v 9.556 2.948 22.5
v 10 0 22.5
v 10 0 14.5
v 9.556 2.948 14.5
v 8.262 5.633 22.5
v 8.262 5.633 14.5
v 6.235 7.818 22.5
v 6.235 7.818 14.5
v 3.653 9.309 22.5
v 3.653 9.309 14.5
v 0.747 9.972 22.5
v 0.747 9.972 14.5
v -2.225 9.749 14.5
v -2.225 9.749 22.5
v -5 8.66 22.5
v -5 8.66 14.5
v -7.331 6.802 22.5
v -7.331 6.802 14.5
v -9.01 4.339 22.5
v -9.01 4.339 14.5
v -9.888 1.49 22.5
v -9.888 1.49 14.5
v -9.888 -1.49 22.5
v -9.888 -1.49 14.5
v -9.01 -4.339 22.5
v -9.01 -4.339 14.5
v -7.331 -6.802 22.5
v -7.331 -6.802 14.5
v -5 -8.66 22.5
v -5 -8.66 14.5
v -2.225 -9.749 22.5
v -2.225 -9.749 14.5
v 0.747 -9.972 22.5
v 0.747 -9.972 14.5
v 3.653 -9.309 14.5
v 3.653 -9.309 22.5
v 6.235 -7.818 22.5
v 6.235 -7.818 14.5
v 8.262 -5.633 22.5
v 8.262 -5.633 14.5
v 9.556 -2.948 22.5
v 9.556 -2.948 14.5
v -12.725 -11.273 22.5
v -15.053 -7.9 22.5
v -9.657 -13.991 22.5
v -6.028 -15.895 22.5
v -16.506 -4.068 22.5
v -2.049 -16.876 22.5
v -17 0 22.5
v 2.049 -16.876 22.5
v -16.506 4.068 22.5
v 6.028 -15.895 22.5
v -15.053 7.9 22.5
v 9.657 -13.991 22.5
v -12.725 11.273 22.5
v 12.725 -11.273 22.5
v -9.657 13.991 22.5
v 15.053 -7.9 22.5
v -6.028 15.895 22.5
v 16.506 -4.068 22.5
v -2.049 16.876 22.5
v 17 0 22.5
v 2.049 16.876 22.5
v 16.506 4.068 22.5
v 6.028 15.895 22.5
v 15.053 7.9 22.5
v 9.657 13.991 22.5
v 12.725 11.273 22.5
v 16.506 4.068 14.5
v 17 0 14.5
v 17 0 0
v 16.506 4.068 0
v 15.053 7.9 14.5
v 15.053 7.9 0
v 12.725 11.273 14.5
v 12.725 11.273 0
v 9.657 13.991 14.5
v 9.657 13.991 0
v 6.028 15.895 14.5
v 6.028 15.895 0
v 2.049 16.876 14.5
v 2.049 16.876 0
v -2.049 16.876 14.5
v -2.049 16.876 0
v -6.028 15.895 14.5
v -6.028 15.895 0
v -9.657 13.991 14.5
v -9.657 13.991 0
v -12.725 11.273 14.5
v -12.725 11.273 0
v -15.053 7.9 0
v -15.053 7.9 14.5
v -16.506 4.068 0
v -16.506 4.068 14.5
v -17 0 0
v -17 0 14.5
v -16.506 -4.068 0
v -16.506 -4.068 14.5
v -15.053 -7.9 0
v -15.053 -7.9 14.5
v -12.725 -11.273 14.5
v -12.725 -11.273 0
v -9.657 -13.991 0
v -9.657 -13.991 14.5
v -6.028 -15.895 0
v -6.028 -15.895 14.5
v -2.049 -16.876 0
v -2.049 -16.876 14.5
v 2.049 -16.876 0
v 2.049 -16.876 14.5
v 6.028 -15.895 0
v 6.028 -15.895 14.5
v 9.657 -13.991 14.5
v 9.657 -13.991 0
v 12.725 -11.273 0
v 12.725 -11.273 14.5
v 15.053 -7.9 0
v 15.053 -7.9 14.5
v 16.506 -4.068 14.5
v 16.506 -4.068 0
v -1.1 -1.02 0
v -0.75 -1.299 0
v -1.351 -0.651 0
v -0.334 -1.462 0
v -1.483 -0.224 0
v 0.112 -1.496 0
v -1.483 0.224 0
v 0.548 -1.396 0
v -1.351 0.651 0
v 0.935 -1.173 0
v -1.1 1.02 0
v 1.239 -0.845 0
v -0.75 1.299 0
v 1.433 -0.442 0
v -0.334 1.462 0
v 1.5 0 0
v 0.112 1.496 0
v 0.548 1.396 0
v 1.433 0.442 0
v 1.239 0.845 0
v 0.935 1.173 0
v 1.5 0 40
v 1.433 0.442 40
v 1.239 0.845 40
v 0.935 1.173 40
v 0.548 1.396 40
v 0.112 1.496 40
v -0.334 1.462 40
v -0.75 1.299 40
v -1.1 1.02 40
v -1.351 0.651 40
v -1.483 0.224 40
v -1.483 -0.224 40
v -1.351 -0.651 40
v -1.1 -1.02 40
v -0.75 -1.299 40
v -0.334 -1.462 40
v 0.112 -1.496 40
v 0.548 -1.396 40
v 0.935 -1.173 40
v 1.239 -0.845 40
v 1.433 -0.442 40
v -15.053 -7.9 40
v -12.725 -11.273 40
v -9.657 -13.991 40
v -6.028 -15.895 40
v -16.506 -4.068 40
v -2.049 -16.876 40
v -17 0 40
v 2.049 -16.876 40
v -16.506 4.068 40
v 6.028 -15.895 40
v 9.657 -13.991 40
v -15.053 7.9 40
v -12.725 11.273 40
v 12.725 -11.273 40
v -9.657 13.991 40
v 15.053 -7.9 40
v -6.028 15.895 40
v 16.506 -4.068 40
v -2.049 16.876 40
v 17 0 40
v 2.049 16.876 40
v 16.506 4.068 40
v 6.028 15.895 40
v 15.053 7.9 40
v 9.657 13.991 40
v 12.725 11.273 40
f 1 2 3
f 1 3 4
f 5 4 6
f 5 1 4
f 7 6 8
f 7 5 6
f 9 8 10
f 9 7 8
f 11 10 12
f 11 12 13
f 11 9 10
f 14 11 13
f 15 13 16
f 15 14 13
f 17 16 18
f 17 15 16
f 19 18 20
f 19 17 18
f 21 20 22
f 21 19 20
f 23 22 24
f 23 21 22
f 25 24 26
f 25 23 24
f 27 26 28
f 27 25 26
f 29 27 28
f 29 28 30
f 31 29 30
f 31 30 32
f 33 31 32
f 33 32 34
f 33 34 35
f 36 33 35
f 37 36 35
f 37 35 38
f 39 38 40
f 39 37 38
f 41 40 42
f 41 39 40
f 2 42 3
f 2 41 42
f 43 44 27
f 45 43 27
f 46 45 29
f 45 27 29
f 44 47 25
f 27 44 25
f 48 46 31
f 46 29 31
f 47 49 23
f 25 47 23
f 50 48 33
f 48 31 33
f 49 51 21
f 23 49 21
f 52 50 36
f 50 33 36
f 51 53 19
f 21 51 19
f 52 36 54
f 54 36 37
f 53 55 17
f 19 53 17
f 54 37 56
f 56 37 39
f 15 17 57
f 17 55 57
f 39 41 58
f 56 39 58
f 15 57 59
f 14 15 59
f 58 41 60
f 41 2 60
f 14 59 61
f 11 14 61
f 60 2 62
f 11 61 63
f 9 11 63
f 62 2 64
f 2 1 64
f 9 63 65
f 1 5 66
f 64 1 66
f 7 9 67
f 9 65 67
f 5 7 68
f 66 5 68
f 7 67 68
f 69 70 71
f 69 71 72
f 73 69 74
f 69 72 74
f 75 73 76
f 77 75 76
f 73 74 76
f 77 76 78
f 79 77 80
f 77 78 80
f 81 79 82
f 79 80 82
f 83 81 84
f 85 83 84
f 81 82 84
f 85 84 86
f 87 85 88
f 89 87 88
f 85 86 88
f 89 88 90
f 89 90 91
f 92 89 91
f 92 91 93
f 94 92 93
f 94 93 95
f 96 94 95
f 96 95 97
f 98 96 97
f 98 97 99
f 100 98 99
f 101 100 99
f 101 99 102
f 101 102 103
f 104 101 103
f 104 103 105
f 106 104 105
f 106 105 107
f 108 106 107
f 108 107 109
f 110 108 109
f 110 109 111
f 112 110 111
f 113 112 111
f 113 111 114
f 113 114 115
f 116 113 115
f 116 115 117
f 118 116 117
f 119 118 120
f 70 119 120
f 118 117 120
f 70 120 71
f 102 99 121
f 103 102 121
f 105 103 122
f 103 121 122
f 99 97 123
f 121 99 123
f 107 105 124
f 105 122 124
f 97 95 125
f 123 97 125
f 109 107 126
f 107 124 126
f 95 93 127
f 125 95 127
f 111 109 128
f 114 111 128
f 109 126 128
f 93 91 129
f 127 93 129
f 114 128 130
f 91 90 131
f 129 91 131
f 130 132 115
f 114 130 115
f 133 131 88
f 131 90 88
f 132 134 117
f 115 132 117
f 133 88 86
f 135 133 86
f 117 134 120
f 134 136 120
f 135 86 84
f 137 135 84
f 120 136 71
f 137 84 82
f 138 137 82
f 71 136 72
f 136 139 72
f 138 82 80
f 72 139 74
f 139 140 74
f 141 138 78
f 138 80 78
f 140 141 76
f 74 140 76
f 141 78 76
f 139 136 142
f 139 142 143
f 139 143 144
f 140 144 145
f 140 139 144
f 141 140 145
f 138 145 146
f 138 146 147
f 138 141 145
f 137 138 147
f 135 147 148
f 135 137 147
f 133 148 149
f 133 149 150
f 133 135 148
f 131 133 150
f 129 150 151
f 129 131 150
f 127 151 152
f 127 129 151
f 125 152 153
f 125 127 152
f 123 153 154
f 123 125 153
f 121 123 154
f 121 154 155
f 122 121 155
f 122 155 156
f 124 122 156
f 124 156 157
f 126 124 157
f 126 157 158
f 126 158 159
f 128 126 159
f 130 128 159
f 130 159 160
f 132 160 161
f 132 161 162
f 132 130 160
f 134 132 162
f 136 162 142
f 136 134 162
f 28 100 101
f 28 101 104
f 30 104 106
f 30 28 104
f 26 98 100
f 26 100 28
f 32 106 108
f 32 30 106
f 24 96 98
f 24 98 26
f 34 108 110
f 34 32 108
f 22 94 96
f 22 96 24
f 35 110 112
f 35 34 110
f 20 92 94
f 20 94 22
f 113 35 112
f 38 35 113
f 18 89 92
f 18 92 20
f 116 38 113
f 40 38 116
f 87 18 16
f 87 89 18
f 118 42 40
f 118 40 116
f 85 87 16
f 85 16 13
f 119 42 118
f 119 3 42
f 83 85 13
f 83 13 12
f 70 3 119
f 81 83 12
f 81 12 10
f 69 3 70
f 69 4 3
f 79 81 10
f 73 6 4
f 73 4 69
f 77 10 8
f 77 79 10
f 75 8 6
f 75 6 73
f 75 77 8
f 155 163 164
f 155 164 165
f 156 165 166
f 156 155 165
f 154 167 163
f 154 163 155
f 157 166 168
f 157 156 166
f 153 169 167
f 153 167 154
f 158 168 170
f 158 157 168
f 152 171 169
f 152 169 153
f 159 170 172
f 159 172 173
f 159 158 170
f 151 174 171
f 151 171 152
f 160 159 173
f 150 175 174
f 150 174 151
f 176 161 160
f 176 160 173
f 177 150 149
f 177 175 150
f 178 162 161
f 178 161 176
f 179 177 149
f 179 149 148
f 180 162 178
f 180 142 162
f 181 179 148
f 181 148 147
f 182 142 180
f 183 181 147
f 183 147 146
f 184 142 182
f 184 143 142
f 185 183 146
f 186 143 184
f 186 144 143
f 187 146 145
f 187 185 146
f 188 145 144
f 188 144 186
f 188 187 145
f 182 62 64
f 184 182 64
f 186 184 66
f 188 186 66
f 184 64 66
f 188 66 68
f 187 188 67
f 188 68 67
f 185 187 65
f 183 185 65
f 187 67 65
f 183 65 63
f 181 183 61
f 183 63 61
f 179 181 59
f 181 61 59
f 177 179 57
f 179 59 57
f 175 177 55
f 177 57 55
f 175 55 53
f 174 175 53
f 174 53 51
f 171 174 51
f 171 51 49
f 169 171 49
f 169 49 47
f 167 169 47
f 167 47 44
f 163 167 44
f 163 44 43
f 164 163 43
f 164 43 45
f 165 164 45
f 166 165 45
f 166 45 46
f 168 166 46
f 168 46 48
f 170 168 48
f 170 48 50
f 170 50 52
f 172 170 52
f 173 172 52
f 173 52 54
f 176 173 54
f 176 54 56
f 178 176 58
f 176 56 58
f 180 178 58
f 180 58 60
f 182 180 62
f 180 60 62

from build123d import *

# Parameters (mm, degrees)
SKETCH1_R           = 17
SKETCH1_R_2         = 1.5
BOSS_EXTRUDE1_DEPTH = 40
CUT_EXTRUDE1_START  = -17.5
SKETCH2_R           = 17
SKETCH2_R_2         = 10
CUT_EXTRUDE1_DEPTH  = 8


with BuildPart() as part:
    # Sketch1 → Boss-Extrude1 (new body)
    with BuildSketch(Plane.XY):
        Circle(SKETCH1_R)
        Circle(SKETCH1_R_2, mode=Mode.SUBTRACT)
    extrude(amount=BOSS_EXTRUDE1_DEPTH)

    # Sketch2 → Cut-Extrude1 (cut)
    with BuildSketch(Plane.XY.offset(40).offset(CUT_EXTRUDE1_START)):
        Circle(SKETCH2_R)
        Circle(SKETCH2_R_2, mode=Mode.SUBTRACT)
    extrude(amount=-CUT_EXTRUDE1_DEPTH, mode=Mode.SUBTRACT)


solid = part.part
